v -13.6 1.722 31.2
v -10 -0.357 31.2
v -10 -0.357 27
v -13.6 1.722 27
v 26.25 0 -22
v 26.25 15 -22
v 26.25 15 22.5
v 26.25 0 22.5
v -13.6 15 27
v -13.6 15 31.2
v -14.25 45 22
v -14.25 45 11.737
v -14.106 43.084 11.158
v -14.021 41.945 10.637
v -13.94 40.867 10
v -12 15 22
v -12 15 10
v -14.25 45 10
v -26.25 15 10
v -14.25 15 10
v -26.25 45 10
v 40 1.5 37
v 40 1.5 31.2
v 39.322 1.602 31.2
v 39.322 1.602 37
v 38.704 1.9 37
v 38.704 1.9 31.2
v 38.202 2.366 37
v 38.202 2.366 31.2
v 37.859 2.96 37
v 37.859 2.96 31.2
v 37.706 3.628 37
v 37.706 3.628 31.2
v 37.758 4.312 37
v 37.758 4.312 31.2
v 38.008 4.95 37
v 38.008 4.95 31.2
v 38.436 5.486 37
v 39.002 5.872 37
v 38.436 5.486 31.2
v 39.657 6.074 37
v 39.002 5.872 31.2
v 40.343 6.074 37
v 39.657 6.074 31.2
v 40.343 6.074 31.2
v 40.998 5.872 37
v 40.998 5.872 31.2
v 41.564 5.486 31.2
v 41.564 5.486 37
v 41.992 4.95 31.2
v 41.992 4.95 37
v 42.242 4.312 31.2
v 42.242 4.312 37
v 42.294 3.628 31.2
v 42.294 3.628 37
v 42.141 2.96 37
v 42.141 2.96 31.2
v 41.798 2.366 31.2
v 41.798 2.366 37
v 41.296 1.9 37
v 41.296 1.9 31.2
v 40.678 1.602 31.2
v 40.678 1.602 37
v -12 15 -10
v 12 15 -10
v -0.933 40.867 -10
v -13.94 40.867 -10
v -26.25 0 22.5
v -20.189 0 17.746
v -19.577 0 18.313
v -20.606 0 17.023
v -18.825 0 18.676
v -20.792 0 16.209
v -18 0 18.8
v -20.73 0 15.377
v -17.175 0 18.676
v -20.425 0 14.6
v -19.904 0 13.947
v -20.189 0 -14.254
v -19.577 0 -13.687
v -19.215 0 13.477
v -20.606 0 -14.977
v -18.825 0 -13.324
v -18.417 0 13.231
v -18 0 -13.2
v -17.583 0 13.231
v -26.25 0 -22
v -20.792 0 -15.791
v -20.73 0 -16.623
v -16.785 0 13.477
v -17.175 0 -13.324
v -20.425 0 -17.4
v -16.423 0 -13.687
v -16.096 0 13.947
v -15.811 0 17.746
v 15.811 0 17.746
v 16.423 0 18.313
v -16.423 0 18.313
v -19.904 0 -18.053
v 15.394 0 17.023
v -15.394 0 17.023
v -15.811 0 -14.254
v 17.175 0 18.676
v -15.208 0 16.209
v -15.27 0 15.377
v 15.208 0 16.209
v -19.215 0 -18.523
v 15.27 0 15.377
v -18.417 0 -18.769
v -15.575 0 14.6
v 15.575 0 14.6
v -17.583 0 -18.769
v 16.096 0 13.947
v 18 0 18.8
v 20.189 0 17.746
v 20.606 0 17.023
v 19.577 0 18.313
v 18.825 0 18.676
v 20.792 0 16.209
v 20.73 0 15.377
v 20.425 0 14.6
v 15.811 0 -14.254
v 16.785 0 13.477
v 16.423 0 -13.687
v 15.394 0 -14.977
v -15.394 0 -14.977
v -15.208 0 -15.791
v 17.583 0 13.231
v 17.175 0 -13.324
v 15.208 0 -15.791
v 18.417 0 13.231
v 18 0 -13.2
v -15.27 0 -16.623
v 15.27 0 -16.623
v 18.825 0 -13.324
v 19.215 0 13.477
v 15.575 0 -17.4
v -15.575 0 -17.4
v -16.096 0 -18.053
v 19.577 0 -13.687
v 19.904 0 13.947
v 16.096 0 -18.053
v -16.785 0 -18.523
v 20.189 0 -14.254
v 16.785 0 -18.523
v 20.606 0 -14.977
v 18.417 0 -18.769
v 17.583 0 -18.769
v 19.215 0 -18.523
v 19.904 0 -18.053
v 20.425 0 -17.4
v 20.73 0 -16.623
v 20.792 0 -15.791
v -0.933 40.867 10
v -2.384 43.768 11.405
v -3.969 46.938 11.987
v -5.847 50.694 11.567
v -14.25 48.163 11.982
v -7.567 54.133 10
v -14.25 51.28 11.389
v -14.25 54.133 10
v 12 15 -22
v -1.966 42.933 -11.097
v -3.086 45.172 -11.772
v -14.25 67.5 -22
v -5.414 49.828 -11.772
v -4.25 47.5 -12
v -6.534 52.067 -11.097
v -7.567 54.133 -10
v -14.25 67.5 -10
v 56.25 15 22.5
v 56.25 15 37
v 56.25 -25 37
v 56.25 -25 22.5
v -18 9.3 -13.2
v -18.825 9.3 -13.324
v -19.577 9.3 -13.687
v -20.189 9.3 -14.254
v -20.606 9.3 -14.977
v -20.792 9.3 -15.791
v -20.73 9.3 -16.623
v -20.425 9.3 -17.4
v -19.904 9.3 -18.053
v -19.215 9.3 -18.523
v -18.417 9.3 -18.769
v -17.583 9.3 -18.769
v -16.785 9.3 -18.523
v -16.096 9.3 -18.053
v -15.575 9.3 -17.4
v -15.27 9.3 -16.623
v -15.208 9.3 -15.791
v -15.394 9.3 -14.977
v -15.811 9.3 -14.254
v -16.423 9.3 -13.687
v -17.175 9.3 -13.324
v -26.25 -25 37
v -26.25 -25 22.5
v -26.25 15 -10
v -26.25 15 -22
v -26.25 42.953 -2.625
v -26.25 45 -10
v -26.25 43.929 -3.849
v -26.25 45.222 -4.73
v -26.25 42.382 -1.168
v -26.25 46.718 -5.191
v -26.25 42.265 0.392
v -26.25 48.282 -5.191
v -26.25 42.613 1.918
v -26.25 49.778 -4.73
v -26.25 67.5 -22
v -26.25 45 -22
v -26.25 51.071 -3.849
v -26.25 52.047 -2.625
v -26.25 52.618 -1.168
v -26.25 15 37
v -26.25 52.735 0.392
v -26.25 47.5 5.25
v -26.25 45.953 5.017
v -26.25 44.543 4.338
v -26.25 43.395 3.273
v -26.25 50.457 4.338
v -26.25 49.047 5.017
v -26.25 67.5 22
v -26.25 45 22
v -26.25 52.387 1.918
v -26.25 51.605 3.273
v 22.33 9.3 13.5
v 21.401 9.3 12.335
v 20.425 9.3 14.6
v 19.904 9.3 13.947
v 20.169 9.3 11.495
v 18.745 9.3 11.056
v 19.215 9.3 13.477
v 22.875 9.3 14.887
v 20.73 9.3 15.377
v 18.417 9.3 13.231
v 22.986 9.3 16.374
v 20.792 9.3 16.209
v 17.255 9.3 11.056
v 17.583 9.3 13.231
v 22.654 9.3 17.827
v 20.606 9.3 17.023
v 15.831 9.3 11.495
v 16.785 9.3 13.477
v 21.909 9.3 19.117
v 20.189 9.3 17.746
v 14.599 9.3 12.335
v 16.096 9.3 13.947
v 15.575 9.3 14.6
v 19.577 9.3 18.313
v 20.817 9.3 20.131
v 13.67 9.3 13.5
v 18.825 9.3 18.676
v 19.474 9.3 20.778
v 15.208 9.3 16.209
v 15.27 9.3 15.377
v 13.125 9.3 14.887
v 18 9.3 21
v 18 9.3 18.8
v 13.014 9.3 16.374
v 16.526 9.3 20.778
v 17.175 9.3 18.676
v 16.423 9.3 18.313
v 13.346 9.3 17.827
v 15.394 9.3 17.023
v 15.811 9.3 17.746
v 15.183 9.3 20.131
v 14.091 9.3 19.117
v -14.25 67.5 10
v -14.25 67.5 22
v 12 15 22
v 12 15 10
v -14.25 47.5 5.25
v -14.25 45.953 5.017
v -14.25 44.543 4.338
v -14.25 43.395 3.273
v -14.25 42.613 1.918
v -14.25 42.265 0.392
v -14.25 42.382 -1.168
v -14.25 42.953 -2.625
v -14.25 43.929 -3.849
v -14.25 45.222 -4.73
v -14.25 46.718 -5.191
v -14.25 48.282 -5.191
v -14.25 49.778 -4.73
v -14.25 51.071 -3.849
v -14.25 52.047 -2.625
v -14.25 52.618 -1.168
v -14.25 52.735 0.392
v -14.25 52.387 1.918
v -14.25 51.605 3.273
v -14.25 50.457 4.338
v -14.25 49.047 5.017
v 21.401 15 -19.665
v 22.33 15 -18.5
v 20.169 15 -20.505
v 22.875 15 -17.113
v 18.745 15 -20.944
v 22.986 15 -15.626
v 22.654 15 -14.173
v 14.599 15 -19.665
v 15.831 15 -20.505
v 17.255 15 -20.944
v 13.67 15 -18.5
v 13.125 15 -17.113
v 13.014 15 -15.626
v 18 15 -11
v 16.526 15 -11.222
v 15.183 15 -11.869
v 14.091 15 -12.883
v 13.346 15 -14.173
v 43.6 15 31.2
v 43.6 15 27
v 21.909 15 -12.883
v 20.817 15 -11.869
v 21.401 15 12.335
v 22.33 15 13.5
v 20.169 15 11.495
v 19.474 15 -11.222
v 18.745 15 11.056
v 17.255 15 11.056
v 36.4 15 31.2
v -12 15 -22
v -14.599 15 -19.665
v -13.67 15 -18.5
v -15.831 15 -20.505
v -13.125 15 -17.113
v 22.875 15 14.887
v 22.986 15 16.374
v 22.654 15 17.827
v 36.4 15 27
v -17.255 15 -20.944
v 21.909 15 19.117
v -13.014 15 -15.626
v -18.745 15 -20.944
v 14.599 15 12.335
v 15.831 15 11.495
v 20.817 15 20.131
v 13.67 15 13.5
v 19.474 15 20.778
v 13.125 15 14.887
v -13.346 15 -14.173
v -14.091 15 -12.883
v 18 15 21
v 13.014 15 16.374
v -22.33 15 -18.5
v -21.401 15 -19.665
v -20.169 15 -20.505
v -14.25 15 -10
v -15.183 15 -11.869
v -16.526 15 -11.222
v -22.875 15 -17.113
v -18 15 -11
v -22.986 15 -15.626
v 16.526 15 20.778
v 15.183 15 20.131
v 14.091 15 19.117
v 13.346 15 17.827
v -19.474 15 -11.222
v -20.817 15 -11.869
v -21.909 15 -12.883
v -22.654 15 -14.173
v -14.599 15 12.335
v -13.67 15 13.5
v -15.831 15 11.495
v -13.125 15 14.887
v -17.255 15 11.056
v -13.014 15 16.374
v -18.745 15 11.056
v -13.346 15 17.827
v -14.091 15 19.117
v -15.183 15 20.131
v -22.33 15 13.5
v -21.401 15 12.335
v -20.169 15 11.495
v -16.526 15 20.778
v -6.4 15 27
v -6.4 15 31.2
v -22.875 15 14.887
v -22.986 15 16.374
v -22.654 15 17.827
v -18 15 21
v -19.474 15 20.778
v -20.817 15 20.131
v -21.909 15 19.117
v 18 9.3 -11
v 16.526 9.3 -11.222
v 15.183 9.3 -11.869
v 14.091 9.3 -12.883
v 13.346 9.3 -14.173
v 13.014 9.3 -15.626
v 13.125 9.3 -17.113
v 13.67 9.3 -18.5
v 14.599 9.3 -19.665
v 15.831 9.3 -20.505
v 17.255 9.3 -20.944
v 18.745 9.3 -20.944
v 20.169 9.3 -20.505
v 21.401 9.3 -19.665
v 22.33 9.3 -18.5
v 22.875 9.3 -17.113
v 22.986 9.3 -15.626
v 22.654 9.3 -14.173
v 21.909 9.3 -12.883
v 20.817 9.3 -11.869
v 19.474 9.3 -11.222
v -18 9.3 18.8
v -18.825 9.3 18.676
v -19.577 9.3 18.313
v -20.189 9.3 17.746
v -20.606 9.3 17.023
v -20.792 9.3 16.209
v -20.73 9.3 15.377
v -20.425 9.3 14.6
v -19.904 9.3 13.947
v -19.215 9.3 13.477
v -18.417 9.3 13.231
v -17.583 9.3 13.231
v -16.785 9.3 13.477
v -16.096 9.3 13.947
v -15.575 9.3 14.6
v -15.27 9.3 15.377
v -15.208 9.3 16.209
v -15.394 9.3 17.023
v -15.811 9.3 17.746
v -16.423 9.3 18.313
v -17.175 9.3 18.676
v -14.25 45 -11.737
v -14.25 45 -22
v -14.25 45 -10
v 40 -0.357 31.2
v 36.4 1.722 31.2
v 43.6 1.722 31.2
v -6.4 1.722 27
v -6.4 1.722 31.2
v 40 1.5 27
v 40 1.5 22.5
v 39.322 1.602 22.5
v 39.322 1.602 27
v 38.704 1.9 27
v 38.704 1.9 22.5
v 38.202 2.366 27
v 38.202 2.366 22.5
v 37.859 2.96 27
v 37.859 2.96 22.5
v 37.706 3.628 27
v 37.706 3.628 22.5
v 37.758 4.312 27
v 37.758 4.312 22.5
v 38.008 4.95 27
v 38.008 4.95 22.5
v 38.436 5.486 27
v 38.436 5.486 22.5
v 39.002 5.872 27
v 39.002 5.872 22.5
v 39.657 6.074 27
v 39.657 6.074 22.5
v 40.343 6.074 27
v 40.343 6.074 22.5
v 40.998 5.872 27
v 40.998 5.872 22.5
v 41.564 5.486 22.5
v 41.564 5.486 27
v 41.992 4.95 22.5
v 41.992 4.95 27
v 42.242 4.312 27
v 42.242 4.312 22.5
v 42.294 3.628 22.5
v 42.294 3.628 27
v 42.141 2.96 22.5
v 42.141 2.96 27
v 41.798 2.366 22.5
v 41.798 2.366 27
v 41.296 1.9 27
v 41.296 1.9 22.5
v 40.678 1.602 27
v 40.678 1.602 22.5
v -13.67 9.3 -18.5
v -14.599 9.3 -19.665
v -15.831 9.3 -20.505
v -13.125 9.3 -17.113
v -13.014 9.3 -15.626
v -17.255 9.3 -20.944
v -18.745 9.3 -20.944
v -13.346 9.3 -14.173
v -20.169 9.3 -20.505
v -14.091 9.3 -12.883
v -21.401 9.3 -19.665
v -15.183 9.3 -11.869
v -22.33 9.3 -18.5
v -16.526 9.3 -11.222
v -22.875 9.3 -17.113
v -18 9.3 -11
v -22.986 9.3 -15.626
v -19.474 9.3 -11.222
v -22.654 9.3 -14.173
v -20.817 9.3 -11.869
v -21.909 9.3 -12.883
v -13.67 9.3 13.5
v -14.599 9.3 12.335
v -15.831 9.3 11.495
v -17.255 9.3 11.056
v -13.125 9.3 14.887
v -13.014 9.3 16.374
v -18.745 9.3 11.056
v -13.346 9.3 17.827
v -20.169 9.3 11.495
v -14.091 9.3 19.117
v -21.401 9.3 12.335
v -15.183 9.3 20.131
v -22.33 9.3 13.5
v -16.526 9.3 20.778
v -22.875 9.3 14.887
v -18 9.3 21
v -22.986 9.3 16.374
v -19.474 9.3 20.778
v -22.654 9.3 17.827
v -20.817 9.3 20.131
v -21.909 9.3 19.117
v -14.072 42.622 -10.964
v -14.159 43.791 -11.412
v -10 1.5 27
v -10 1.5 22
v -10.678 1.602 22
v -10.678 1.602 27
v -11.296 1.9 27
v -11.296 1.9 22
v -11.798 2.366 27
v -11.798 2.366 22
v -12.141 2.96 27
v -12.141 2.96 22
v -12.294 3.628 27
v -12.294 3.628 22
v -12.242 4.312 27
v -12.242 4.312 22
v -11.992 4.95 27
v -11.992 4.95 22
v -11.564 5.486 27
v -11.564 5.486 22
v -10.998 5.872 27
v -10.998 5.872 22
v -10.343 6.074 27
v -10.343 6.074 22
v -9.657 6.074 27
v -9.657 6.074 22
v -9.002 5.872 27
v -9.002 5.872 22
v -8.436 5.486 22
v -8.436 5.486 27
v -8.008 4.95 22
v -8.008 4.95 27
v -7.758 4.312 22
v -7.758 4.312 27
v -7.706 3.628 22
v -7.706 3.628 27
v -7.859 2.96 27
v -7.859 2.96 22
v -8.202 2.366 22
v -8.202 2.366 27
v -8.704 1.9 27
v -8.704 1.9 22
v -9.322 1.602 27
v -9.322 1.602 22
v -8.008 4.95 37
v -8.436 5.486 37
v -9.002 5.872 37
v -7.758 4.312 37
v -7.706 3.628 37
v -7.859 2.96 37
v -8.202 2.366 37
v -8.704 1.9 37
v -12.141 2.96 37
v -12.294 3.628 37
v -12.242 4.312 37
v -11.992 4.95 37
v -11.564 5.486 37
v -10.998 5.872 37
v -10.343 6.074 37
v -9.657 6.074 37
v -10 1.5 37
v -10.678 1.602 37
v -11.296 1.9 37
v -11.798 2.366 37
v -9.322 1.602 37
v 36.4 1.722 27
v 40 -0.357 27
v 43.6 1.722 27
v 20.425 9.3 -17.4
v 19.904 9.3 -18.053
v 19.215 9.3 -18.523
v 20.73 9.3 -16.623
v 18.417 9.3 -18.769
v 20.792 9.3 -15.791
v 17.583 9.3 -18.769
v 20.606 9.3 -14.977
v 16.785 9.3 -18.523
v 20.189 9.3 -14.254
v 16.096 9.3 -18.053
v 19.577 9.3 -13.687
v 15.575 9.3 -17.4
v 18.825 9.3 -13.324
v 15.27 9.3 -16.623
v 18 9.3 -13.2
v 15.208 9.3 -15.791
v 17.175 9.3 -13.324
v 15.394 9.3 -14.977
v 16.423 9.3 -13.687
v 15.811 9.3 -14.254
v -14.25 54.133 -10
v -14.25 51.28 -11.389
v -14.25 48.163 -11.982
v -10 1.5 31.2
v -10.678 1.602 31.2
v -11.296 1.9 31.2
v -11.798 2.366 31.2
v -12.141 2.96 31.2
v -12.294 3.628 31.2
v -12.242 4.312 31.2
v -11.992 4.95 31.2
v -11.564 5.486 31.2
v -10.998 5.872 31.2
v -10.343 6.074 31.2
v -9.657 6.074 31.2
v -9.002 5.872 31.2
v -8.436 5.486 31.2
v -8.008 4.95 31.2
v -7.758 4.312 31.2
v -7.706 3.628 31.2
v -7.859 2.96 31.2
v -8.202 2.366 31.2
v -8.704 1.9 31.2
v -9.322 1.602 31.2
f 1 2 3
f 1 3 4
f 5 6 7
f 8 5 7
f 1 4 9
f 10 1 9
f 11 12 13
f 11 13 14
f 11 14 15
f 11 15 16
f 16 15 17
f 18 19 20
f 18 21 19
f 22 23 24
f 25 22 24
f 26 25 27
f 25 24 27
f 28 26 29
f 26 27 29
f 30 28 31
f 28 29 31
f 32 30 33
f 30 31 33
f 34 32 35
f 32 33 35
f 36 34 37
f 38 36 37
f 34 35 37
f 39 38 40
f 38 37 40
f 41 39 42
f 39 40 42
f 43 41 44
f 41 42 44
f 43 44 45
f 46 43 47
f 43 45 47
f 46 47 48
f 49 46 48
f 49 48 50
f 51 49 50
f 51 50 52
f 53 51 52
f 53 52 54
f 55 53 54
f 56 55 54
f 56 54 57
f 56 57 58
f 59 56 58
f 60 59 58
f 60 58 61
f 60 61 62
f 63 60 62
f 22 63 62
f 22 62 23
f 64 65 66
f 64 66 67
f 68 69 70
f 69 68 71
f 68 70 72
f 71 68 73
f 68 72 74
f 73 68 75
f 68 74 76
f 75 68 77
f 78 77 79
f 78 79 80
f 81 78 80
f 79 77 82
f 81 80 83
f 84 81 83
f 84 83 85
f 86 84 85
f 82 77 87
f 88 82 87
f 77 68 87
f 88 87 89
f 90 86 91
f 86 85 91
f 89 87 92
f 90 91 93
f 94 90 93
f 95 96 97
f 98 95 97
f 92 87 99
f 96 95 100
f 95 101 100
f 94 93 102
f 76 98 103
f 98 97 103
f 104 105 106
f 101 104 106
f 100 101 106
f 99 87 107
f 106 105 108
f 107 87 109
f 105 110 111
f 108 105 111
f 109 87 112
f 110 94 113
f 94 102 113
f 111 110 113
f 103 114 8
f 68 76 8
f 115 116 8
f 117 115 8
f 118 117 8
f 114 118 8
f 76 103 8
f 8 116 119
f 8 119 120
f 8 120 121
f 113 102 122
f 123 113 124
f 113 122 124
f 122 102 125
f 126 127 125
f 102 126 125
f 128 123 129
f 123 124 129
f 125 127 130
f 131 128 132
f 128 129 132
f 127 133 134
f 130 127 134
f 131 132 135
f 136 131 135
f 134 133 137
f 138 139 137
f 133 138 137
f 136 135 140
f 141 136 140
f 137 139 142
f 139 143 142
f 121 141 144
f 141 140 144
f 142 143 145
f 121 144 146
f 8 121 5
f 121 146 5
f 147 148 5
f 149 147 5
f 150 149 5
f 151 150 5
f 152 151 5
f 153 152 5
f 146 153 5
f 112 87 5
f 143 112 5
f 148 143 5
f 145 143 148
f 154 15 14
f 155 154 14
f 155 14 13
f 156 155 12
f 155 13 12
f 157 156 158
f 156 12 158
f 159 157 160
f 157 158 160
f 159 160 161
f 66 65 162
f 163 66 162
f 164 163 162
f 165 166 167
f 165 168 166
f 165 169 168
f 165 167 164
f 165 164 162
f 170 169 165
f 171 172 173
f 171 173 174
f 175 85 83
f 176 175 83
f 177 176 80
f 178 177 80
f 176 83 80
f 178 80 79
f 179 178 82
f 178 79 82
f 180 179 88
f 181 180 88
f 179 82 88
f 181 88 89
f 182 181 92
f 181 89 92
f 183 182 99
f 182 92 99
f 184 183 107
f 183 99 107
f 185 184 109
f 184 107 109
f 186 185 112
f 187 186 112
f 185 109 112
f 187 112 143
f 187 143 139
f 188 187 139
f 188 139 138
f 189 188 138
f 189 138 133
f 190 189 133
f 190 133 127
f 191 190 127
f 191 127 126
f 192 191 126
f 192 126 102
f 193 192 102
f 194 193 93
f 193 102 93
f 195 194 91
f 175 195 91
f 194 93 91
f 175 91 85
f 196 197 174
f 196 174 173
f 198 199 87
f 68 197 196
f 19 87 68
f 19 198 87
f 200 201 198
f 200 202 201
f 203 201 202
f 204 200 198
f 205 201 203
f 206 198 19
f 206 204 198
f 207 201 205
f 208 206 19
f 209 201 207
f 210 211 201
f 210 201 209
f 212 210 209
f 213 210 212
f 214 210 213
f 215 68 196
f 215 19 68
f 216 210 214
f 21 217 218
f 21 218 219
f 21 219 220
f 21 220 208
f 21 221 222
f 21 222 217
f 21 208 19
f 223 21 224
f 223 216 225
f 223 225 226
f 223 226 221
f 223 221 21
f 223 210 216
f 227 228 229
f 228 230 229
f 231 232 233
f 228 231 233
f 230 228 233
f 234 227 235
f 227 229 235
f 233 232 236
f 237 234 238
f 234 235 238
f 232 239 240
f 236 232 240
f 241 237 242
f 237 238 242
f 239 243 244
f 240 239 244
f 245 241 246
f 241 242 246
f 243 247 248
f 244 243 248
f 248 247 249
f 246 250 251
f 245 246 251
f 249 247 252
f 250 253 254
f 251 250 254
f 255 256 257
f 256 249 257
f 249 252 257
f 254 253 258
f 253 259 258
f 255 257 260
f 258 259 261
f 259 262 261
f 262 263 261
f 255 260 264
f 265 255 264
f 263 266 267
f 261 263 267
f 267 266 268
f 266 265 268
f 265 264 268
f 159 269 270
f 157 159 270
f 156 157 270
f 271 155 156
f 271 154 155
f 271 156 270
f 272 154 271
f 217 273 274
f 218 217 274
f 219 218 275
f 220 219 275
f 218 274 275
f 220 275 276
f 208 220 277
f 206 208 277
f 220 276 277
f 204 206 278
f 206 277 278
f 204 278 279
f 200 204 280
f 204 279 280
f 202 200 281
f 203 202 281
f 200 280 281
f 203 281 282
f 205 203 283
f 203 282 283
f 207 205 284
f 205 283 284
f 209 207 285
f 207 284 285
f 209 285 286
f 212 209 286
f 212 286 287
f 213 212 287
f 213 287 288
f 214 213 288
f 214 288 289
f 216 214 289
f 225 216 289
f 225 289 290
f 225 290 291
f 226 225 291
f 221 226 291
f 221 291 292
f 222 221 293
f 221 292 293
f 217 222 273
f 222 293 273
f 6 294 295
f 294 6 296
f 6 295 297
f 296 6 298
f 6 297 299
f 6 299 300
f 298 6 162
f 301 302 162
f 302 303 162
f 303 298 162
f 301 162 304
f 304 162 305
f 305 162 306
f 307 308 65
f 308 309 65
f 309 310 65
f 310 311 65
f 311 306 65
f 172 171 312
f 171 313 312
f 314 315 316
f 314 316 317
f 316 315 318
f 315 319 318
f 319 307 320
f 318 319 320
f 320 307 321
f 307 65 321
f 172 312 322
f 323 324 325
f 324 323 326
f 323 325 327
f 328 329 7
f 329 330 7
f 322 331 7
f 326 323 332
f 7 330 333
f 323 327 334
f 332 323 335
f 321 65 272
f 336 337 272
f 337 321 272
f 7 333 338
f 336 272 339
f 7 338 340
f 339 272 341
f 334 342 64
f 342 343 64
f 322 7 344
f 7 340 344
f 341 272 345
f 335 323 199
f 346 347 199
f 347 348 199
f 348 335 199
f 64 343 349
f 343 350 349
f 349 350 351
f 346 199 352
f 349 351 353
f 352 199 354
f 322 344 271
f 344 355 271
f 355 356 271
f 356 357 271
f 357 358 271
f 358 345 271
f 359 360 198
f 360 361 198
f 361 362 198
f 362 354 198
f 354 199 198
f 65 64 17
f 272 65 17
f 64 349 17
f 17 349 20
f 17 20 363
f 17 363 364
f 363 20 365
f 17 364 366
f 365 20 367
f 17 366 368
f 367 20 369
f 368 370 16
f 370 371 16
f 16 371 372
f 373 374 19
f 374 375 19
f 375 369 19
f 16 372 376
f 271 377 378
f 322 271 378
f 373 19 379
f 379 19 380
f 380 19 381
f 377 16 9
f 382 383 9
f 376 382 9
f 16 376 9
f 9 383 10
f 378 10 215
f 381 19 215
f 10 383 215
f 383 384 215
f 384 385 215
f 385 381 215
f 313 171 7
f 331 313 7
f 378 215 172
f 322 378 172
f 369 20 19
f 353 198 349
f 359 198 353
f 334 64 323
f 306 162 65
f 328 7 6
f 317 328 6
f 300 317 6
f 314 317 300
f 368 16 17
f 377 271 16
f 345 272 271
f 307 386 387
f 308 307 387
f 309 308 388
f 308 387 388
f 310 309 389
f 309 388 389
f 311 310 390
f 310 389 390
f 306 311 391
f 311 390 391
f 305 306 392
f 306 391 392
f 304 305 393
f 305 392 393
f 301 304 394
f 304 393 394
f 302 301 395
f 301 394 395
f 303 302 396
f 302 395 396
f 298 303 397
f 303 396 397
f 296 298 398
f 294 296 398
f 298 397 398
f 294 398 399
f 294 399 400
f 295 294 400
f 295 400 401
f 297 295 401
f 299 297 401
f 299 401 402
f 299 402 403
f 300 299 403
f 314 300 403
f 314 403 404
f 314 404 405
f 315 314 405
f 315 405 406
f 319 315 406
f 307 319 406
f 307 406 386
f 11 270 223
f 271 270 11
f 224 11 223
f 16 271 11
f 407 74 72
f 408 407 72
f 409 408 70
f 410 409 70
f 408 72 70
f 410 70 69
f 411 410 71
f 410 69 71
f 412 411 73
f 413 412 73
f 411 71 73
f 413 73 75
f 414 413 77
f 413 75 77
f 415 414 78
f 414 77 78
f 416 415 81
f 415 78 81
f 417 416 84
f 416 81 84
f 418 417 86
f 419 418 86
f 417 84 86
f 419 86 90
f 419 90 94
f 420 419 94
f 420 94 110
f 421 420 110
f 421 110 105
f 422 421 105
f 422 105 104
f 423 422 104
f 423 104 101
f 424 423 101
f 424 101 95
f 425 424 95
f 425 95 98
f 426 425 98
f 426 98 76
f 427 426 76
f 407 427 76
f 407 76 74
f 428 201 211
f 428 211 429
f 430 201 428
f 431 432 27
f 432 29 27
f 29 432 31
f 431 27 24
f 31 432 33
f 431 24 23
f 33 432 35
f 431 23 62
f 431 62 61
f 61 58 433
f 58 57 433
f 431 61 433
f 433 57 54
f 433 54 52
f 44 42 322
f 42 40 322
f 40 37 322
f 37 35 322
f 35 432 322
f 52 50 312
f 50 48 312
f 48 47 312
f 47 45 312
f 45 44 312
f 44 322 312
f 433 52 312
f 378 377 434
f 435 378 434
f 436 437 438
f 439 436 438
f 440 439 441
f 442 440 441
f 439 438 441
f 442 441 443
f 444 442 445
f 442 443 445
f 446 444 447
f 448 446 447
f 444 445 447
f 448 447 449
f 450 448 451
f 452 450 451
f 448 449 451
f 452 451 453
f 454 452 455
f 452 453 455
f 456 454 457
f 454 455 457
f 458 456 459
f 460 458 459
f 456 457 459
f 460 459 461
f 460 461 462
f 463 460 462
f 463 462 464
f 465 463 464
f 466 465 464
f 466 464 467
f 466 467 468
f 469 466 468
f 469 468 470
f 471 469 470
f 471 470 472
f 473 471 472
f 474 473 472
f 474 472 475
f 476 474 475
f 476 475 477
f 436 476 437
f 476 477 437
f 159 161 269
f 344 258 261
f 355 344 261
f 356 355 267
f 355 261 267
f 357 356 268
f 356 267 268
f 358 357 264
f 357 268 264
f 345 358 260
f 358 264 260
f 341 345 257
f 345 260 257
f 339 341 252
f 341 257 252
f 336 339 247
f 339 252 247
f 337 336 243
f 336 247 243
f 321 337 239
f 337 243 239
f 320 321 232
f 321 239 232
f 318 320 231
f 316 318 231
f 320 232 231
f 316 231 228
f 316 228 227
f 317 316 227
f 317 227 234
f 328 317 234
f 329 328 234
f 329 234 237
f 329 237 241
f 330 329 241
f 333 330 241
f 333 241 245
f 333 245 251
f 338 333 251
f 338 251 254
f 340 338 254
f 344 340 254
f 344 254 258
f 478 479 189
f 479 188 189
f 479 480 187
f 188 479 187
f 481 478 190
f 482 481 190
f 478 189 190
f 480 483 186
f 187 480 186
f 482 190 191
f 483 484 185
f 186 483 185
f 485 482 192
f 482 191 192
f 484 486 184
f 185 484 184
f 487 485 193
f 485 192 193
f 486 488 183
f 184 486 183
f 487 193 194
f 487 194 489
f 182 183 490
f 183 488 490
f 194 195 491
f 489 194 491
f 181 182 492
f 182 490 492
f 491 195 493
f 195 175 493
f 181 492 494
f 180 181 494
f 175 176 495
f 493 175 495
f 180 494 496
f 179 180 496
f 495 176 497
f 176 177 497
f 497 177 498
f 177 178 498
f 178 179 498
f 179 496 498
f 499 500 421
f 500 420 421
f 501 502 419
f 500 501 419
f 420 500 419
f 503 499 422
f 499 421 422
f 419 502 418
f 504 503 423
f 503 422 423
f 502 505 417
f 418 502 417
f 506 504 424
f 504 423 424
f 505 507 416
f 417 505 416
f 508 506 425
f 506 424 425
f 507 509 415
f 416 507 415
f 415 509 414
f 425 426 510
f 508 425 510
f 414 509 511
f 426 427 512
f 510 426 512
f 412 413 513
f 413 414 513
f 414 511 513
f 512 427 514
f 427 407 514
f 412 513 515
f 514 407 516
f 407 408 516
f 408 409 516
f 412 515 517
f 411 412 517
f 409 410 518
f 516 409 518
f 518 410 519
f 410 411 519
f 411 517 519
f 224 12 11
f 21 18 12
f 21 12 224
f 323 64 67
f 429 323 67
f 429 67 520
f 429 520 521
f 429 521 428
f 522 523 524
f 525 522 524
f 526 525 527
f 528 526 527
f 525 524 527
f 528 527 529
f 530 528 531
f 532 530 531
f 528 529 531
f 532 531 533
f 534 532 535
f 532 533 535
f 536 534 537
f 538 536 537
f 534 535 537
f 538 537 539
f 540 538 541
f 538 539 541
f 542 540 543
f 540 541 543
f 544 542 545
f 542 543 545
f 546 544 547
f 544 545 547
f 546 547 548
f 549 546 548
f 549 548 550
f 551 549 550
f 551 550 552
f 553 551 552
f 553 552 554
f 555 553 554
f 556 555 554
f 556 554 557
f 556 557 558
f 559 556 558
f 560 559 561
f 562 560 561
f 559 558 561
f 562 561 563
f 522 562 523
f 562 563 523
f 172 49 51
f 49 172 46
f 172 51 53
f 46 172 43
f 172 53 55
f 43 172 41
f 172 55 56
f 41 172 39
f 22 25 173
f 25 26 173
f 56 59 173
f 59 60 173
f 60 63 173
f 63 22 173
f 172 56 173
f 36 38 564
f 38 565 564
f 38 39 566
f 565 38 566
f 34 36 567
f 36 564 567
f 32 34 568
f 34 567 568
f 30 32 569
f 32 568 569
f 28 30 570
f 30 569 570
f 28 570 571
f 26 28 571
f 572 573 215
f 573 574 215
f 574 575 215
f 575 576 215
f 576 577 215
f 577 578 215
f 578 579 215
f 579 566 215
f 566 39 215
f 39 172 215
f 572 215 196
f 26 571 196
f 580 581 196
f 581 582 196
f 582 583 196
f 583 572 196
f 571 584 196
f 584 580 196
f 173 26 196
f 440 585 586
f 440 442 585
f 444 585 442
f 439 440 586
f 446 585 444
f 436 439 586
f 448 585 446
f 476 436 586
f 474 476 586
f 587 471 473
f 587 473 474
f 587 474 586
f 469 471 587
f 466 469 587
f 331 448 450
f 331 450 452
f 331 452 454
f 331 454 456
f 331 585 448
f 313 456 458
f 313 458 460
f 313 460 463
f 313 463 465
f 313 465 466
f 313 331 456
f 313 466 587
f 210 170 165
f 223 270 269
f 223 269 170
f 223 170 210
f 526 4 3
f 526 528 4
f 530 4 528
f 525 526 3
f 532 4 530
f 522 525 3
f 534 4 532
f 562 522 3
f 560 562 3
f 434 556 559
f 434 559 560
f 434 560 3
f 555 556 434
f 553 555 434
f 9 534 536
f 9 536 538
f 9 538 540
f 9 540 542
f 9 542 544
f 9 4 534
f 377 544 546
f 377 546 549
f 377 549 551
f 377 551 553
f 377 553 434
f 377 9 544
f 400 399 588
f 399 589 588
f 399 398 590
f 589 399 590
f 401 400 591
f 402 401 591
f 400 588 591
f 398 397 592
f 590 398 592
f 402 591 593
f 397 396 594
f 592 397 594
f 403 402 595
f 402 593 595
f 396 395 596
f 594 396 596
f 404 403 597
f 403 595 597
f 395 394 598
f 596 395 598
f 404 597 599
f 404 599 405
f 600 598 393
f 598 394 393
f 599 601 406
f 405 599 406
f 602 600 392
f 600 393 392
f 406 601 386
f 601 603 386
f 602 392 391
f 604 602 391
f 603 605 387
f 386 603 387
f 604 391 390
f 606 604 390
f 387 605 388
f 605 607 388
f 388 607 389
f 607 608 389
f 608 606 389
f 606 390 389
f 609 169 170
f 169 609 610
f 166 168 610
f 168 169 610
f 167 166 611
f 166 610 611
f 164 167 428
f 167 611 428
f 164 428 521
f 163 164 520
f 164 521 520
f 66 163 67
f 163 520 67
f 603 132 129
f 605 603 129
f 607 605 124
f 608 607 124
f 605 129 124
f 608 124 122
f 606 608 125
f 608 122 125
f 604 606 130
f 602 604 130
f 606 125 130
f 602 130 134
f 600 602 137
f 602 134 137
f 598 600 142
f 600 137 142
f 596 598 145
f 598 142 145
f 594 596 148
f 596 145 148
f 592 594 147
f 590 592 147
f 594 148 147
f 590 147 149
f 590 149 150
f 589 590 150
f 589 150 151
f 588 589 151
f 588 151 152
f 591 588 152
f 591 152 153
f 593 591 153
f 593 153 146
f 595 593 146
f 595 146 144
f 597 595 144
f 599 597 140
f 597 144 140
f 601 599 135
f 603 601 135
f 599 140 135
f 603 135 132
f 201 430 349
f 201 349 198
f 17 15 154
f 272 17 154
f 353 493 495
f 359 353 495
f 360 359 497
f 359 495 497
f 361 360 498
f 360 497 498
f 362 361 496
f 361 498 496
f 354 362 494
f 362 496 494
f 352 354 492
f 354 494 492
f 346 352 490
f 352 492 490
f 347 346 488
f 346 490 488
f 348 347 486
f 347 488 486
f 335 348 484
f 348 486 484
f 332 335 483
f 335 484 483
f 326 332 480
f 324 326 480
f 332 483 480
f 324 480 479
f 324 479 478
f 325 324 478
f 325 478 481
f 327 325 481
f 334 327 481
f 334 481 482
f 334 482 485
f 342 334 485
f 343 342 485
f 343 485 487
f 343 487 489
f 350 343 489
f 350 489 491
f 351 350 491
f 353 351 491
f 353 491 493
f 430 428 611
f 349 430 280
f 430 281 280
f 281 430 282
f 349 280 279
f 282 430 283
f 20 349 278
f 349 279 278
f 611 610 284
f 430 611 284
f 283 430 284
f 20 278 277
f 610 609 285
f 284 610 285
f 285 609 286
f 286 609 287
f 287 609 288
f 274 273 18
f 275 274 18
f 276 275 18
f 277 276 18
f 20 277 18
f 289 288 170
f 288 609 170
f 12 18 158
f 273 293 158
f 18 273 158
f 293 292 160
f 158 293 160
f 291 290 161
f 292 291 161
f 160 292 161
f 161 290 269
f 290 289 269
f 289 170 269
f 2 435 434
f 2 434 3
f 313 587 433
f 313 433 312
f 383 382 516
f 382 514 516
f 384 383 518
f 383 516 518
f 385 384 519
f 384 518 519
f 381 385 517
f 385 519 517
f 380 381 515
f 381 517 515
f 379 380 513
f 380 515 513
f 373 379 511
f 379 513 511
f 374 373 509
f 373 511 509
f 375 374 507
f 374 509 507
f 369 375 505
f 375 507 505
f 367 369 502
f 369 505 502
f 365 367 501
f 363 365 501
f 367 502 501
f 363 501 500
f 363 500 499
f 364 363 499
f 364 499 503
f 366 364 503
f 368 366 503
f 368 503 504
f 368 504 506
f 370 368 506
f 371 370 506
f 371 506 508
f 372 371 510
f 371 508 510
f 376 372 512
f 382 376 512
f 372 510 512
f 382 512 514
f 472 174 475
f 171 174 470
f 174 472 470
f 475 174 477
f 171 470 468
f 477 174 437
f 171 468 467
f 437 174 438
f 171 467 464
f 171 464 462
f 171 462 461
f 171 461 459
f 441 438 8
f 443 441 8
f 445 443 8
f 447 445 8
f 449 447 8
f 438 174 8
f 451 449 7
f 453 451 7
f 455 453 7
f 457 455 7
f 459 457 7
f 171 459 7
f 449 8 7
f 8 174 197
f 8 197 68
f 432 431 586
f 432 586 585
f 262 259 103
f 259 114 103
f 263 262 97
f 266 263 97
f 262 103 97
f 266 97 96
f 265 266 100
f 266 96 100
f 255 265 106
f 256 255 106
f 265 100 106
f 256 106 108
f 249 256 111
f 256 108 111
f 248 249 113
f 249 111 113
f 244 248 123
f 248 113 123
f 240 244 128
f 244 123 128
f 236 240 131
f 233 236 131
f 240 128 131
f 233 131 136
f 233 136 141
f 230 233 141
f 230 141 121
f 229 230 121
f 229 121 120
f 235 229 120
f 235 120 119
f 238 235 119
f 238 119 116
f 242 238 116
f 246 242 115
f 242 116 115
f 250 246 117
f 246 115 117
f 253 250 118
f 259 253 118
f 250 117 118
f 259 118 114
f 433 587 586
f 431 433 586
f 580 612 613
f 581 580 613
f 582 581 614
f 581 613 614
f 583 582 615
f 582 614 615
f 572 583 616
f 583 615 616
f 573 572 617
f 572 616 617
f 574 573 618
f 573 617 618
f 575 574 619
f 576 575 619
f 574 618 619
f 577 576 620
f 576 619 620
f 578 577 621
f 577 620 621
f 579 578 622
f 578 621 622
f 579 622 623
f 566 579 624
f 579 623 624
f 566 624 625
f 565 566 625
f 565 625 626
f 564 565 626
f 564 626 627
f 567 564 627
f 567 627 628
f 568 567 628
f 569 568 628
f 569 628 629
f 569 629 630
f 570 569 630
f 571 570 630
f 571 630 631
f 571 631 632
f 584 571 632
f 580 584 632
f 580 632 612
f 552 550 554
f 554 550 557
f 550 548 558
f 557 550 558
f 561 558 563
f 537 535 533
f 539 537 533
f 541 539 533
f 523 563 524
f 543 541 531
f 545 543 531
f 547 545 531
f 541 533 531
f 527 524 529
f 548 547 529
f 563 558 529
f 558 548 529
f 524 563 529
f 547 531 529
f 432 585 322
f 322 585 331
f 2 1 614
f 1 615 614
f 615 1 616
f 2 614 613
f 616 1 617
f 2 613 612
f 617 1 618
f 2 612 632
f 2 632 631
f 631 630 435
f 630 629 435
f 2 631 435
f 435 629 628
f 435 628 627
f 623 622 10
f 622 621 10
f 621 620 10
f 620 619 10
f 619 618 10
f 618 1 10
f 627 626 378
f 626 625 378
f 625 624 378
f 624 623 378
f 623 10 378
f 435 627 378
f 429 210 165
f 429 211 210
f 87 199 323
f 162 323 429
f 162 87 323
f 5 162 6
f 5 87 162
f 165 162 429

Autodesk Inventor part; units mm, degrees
ref_plane "YZ Plane" through (0, 0, 0) normal (1, 0, 0) x (0, 1, 0)
ref_plane "XZ Plane" through (0, 0, 0) normal (0, 1, 0) x (-1, 0, 0)
ref_plane "XY Plane" through (0, 0, 0) normal (0, 0, 1) x (1, 0, 0)
sketch "Sketch1" plane through (0, 0, 0) normal (0, 1, 0) x (-1, 0, 0)
  line L0 (-26.25, 22) -> (26.25, 22)
  line L1 (26.25, 22) -> (26.25, -22)
  line L2 (26.25, -22) -> (-26.25, -22)
  line L3 (-26.25, -22) -> (-26.25, 22)
  line L4 (-26.25, 22) -> (26.25, -22) construction
  line L5 (26.25, 22) -> (-26.25, -22) construction
  point P0 (0, 0)
  dimension "d0" = 44
  dimension "d1" = 52.5
extrude "Extrusion1" add sketch "Sketch1" along normal blind 67.5
sketch "Sketch2" plane through (0, 67.5, 0) normal (0, 1, 0) x (1, 0, 0)
  line L0 (18, -16) -> (-18, -16) construction
  line L1 (-18, -16) -> (-18, 16) construction
  line L2 (-18, 16) -> (18, 16) construction
  line L3 (18, 16) -> (18, -16) construction
  line L4 (18, -16) -> (-18, 16) construction
  line L5 (-18, -16) -> (18, 16) construction
  point P0 (0, 0)
  point P1 (-18, 16)
  dimension "d4" = 32
  dimension "d5" = 36
hole "Hole1" at (-18, 67.5, -16) at (-18, 67.5, 16) at (18, 67.5, 16) at (18, 67.5, -16) direction (0, -1, 0) diameter 5.6 end through all
sketch "Sketch3" plane through (-26.25, 0, -22) normal (-1, 0, 0) x (0, 0, 1)
  line L0 (0, 0) -> (44, 0) projected
  line L1 (44, 0) -> (44, 67.5) projected
  line L2 (0, 67.5) -> (44, 67.5) projected
  line L3 (0, 0) -> (0, 67.5) projected
  point P0 (22, 0)
  point P1 (22, 47.5)
  point P2 (22, 0)
  dimension "d13" = 47.5
hole "Hole2" at (-26.25, 47.5, 0) direction (1, 0, 0) diameter 10.5 end through all
sketch "Sketch4" plane through (0, 67.5, 0) normal (0, 1, 0) x (1, 0, 0)
  circle A0 centre (18, 16) radius 2.8 projected
  circle A1 centre (18, -16) radius 2.8 projected
  circle A2 centre (-18, -16) radius 2.8 projected
  circle A3 centre (-18, 16) radius 2.8 projected
  line L0 (26.25, 22) -> (-26.25, 22) projected
  line L1 (-26.25, 22) -> (-26.25, -22) projected
  line L2 (-26.25, -22) -> (26.25, -22) projected
  line L3 (26.25, -22) -> (26.25, 22) projected
  line L4 (26.25, 22) -> (-14.25, 22)
  line L5 (-14.25, 22) -> (-14.25, -22)
  line L6 (-14.25, -22) -> (26.25, -22)
  line L7 (26.25, -22) -> (26.25, 22)
  line L8 (-26.25, 22) -> (-14.25, 22)
  line L9 (-14.25, 22) -> (-14.25, 10)
  line L10 (-14.25, 10) -> (-26.25, 10)
  line L11 (-26.25, 10) -> (-26.25, 22)
  line L12 (-14.25, -22) -> (-26.25, -22)
  line L13 (-26.25, -22) -> (-26.25, -10)
  line L14 (-26.25, -10) -> (-14.25, -10)
  line L15 (-14.25, -10) -> (-14.25, -22)
  point P0 (0, 0)
  dimension "d21" = 12
  dimension "d22" = 6
  dimension "d23" = 6
  dimension "d24" = 6
extrude "Extrusion2" cut sketch "Sketch4" against normal blind 52.5 contours L3 L2 L5 L0 | L5 L10 L1 L0 | L2 L1 L14 L5
sketch "Sketch5" plane through (-26.25, 67.5, 10) normal (0, 0, 1) x (1, 0, 0)
  line L0 (0, 0) -> (12, 0) projected
  line L1 (0, -52.5) -> (0, 0) projected
  line L2 (0, -52.5) -> (12, -52.5) projected
  line L3 (12, 0) -> (12, -52.5) projected
  line L4 (52.5, -52.5) -> (0, -52.5) projected
  line L5 (11.05, -52.5) -> (5.45, -52.5) projected
  line L6 (8.25, -52.5) -> (8.25, 0) construction
  line L7 (12, -22.5) -> (14.25, -52.5)
  line L8 (12, 0) -> (38.25, -52.5)
  line L9 (47.05, -52.5) -> (41.45, -52.5) projected
  line L10 (44.25, -52.5) -> (44.25, -22.1018) construction
  line L11 (12, -22.5) -> (0, -22.5)
  line L12 (0, -22.5) -> (0, 0)
  line L13 (0, 0) -> (12, 0)
  line L14 (38.25, -52.5) -> (14.25, -52.5)
  point P0 (26.25, -67.5)
  dimension "d27" = 30
  dimension "d28" = 36
  dimension "d29" = 6
  dimension "d30" = 6
extrude "Extrusion3" add sketch "Sketch5" along normal up to surface (12 mm away) contours L0 L3 L11 L1 | L8 L4 L7 L3
sketch "Sketch6" plane through (0, 15, 0) normal (0, 1, 0) x (1, 0, 0)
  circle A0 centre (-18, -16) radius 2.8 projected
  circle A1 centre (18, -16) radius 2.8 projected
  circle A2 centre (18, 16) radius 2.8 projected
  circle A3 centre (-18, 16) radius 2.8 projected
  circle A4 centre (-18, 16) radius 2.8 projected
  point P0 (0, 0)
hole "Hole3" at (-18, 15, 16) at (18, 15, -16) at (-18, 15, -16) at (18, 15, 16) direction (0, -1, 0) diameter 5.5 end through all counterbore diameter 10 counterbore depth 5.7 clearance for "Socket Head Cap Screw ISO 4762" size "M5" standard "ISO"
mirror "Mirror1" about plane through (0, 0, 0) normal (0, 0, 1) of "Extrusion3"
sketch "Sketch7" plane through (-14.25, 15, 10) normal (1, 0, 0) x (0, 0, -1)
  circle A0 centre (10, 32.5) radius 5.25 projected
  circle A1 centre (10, 32.5) radius 12
  point P0 (10, -15)
  dimension "d40" = 24
extrude "Extrusion4" cut sketch "Sketch7" along normal through all contours A0 | A1
sketch "Sketch8" plane through (-26.25, 0, 22) normal (0, 0, 1) x (1, 0, 0)
  line L0 (52.5, 15) -> (38.25, 15) projected
  line L1 (12, 67.5) -> (38.25, 15) projected
  line L2 (0, 67.5) -> (12, 67.5) projected
  line L3 (0, 45) -> (0, 67.5) projected
  line L4 (12, 45) -> (0, 45) projected
  line L5 (14.25, 15) -> (12, 45) projected
  line L6 (14.25, 15) -> (0, 15) projected
  line L7 (0, 0) -> (0, 15) projected
  line L8 (0, 0) -> (52.5, 0) projected
  line L9 (52.5, 0) -> (52.5, 15) projected
  line L10 (14.25, 15) -> (38.25, 15)
  point P0 (26.25, 0)
extrude "Extrusion5" add sketch "Sketch8" along normal blind 15 contours L9 L8 L7 L6 L10 L0
sketch "Sketch9" plane through (0, 0, 0) normal (0, -1, 0) x (1, 0, 0)
  circle A0 centre (18, -16) radius 2.8 projected
  circle A1 centre (18, 16) radius 2.8 projected
  circle A2 centre (-18, 16) radius 2.8 projected
  circle A3 centre (-18, -16) radius 2.8 projected
  line L0 (26.25, -22) -> (-26.25, -22) projected
  line L1 (26.25, -22) -> (26.25, 37) projected
  line L2 (-26.25, 37) -> (26.25, 37) projected
  line L3 (-26.25, -22) -> (-26.25, 37) projected
  line L4 (-26.25, 22.5) -> (27.0192, 22.5)
  point P0 (0, 0)
  point P1 (26.25, 22.5)
  dimension "d45" = 14.5
extrude "Extrusion6" add sketch "Sketch9" along normal blind 25 contours L4 L3 L2 L1
sketch "Sketch10" plane through (26.25, 0, -22) normal (1, 0, 0) x (0, 0, -1)
  line L0 (0, 15) -> (-59, 15) projected
  line L1 (-59, 15) -> (-59, -25) projected
  line L2 (-44.5, -25) -> (-59, -25) projected
  line L3 (-44.5, 0) -> (-44.5, -25) projected
  line L4 (0, 0) -> (-44.5, 0) projected
  line L5 (0, 0) -> (0, 15) projected
  line L6 (-44.5, 0) -> (-44.5, 15)
  point P0 (-22, 0)
extrude "Extrusion7" add sketch "Sketch10" along normal blind 30 contours L6 L3 L2 L1 L0
sketch "Sketch11" plane through (-26.25, 0, 37) normal (0, 0, 1) x (1, 0, 0)
  line L0 (0, 15) -> (0, -25) projected
  line L1 (0, -25) -> (82.5, -25) projected
  line L2 (82.5, 15) -> (82.5, -25) projected
  line L3 (0, 15) -> (82.5, 15) projected
  line L4 (0, 15) -> (82.5, -25) construction
  line L5 (82.5, 15) -> (0, -25) construction
  line L6 (-31.1297, -30) -> (116.2871, -30) construction
  point P0 (26.25, 0)
  point P1 (16.25, 3.8)
  point P2 (66.25, 3.8)
  point P3 (41.25, -5)
  dimension "d50" = 50
  dimension "d51" = 25
  dimension "d52" = 5
  dimension "d53" = 33.8
hole "Hole4" at (-10, 3.8, 37) at (40, 3.8, 37) direction (0, 0, -1) diameter 4.6 depth 10
sketch "Sketch12" plane through (40, 3.8, 27) normal (0, 0, 1) x (1, 0, 0)
  circle A0 centre (0, 0) radius 2.3 projected
  circle A1 centre (-50, 0) radius 2.3 projected
  line L0 (-46.4, 2.0785) -> (-46.4, -2.0785)
  line L1 (-46.4, -2.0785) -> (-50, -4.1569)
  line L2 (-50, -4.1569) -> (-53.6, -2.0785)
  line L3 (-53.6, -2.0785) -> (-53.6, 2.0785)
  line L4 (-53.6, 2.0785) -> (-50, 4.1569)
  line L5 (-50, 4.1569) -> (-46.4, 2.0785)
  line L6 (0, 4.1569) -> (3.6, 2.0785)
  line L7 (3.6, 2.0785) -> (3.6, -2.0785)
  line L8 (3.6, -2.0785) -> (0, -4.1569)
  line L9 (0, -4.1569) -> (-3.6, -2.0785)
  line L10 (-3.6, -2.0785) -> (-3.6, 2.0785)
  line L11 (-3.6, 2.0785) -> (0, 4.1569)
  line L12 (-66.25, 11.2) -> (16.25, 11.2) projected
  line L13 (-53.6, 2.0785) -> (-53.6, 11.2)
  line L14 (-46.4, 2.0785) -> (-46.4, 11.2)
  line L15 (-3.6, 2.0785) -> (-3.6, 11.2)
  line L16 (3.6, 2.0785) -> (3.6, 11.2)
  point P0 (-40, -3.8)
  point P1 (-50, 0)
  dimension "d61" = 7.2
extrude "Extrusion8" cut sketch "Sketch12" along normal blind 4.2
sketch "Sketch13" plane through (-13.6, 1.7215, 27) normal (0, 0, 1) x (1, 0, 0)
  circle A0 centre (3.6, 2.0785) radius 2.3 projected
  circle A1 centre (3.6, 2.0785) radius 2.3 projected
  circle A2 centre (53.6, 2.0785) radius 2.3 projected
  circle A3 centre (53.6, 2.0785) radius 2.3 projected
  point P0 (13.6, -1.7215)
hole "Hole5" at (-10, 3.8, 27) at (40, 3.8, 27) direction (0, 0, -1) diameter 4.6 depth 5
equation "\"d23\" = d22"
equation "\"d24\" = d23"
equation "\"d30\" = d29"
equation "\"d51\" = 0.5 * d50"
properties part number "Part1_3DPrint"
